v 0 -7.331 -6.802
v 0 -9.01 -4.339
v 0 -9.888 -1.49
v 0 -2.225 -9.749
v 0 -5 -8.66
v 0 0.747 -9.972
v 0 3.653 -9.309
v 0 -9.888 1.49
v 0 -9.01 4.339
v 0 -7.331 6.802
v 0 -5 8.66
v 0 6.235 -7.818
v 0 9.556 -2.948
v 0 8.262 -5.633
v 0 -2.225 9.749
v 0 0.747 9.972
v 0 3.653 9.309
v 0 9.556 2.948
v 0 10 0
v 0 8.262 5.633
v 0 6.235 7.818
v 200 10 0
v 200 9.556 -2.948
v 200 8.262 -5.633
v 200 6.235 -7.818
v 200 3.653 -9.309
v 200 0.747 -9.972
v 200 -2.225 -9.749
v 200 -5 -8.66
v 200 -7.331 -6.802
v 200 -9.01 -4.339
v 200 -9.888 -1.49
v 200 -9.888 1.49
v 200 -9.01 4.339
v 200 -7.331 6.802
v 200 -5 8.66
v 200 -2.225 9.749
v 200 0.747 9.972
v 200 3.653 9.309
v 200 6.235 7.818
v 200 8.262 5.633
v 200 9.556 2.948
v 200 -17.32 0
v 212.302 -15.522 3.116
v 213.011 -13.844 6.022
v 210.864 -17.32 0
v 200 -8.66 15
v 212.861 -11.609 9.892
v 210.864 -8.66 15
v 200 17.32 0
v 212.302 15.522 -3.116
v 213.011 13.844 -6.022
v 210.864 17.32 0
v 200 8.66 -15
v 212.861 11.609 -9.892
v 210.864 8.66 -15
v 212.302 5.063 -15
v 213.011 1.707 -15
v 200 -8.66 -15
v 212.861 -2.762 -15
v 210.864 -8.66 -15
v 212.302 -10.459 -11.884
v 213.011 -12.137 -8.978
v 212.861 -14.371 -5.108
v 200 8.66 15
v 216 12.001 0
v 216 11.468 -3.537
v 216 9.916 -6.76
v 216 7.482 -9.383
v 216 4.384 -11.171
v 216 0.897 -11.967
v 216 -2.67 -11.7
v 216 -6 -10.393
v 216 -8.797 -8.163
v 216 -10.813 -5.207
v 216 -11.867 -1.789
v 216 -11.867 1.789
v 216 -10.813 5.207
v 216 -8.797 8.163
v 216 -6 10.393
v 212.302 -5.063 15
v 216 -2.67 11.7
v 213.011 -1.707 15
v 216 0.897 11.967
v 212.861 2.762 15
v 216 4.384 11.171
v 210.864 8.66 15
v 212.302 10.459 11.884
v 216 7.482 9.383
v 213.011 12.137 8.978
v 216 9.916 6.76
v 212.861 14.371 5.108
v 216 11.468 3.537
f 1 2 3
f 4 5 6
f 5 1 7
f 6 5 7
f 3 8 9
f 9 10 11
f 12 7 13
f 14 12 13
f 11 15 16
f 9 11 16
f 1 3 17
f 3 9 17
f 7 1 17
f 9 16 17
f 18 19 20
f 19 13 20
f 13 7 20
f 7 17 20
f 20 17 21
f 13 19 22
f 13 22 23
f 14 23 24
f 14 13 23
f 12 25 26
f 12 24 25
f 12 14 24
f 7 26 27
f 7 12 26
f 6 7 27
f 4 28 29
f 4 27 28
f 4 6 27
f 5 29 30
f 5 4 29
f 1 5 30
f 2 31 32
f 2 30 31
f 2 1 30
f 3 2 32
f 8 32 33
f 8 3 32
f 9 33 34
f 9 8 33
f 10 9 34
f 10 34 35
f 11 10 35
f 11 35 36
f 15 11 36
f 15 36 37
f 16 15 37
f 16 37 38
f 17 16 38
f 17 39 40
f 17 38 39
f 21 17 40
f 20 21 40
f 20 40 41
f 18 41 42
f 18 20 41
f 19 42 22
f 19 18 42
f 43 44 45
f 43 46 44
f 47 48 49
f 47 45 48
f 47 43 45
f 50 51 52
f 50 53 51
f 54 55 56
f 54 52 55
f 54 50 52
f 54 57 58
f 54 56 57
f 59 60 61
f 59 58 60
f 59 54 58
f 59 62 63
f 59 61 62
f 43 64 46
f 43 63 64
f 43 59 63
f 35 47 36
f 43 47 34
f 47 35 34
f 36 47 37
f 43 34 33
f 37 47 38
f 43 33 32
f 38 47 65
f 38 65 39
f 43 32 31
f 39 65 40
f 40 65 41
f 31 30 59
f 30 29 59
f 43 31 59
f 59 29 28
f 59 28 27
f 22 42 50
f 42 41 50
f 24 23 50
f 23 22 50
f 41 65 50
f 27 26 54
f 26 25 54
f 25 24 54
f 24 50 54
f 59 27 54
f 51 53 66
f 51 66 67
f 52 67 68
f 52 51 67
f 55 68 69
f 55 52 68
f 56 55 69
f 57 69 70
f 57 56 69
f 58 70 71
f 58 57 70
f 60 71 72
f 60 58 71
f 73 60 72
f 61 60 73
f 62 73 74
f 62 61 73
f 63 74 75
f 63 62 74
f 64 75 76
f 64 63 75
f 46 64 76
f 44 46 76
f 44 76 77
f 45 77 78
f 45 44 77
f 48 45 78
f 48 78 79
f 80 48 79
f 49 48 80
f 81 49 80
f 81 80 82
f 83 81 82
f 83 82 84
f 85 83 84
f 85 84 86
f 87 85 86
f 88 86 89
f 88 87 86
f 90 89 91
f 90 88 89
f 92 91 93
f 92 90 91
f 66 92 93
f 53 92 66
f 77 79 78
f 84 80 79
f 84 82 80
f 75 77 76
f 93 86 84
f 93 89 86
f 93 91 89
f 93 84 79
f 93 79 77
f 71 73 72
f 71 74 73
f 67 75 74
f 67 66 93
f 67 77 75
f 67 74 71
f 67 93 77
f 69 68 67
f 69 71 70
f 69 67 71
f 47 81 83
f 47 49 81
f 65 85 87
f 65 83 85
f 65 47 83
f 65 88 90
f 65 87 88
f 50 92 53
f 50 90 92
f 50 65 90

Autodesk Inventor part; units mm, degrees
ref_plane "YZ Plane" through (0, 0, 0) normal (1, 0, 0) x (0, 1, 0)
ref_plane "XZ Plane" through (0, 0, 0) normal (0, 1, 0) x (-1, 0, 0)
ref_plane "XY Plane" through (0, 0, 0) normal (0, 0, 1) x (1, 0, 0)
sketch "Sketch1" plane through (0, 0, 0) normal (0, 0, 1) x (1, 0, 0)
  line L0 (0, 0) -> (200, 0)
  line L1 (200, 0) -> (200, 10)
  line L2 (200, 10) -> (0, 10)
  line L3 (0, 10) -> (0, 0)
  dimension "d0" = 10
  dimension "d1" = 200
revolve "Revolution1" add sketch "Sketch1" angle 360 about axis through (0, 0, 0) along (1, 0, 0)
sketch "Sketch2" plane through (200, 0, 0) normal (1, 0, 0) x (0, 0, -1)
  line L0 (0, 17.3205) -> (15, 8.6603)
  line L1 (15, 8.6603) -> (15, -8.6603)
  line L2 (15, -8.6603) -> (0, -17.3205)
  line L3 (0, -17.3205) -> (-15, -8.6603)
  line L4 (-15, -8.6603) -> (-15, 8.6603)
  line L5 (-15, 8.6603) -> (0, 17.3205)
  point P0 (0, 0)
  point P1 (0, 0)
  dimension "d3" = 15
extrude "Extrusion1" add sketch "Sketch2" along normal blind 16
sketch "Sketch3" plane through (0, 0, 0) normal (0, 0, 1) x (1, 0, 0)
  line L0 (203.9505, 24.4808) -> (221.3427, 24.4808)
  line L1 (221.3427, 24.4808) -> (221.3427, 6.4675)
  line L2 (221.3427, 6.4675) -> (203.9505, 24.4808)
  line L3 (-22.4415, 0) -> (345.1219, 0) construction
  point P0 (0, 0)
revolve "Revolution2" cut sketch "Sketch3" angle 360 about axis through (-22.4415, 0, 0) along (1, 0, 0)
thread "Thread1" size "M20x2.5" class "6g" standard "ANSI Metric M Profile" full length
properties part number "bolt M20x200"
